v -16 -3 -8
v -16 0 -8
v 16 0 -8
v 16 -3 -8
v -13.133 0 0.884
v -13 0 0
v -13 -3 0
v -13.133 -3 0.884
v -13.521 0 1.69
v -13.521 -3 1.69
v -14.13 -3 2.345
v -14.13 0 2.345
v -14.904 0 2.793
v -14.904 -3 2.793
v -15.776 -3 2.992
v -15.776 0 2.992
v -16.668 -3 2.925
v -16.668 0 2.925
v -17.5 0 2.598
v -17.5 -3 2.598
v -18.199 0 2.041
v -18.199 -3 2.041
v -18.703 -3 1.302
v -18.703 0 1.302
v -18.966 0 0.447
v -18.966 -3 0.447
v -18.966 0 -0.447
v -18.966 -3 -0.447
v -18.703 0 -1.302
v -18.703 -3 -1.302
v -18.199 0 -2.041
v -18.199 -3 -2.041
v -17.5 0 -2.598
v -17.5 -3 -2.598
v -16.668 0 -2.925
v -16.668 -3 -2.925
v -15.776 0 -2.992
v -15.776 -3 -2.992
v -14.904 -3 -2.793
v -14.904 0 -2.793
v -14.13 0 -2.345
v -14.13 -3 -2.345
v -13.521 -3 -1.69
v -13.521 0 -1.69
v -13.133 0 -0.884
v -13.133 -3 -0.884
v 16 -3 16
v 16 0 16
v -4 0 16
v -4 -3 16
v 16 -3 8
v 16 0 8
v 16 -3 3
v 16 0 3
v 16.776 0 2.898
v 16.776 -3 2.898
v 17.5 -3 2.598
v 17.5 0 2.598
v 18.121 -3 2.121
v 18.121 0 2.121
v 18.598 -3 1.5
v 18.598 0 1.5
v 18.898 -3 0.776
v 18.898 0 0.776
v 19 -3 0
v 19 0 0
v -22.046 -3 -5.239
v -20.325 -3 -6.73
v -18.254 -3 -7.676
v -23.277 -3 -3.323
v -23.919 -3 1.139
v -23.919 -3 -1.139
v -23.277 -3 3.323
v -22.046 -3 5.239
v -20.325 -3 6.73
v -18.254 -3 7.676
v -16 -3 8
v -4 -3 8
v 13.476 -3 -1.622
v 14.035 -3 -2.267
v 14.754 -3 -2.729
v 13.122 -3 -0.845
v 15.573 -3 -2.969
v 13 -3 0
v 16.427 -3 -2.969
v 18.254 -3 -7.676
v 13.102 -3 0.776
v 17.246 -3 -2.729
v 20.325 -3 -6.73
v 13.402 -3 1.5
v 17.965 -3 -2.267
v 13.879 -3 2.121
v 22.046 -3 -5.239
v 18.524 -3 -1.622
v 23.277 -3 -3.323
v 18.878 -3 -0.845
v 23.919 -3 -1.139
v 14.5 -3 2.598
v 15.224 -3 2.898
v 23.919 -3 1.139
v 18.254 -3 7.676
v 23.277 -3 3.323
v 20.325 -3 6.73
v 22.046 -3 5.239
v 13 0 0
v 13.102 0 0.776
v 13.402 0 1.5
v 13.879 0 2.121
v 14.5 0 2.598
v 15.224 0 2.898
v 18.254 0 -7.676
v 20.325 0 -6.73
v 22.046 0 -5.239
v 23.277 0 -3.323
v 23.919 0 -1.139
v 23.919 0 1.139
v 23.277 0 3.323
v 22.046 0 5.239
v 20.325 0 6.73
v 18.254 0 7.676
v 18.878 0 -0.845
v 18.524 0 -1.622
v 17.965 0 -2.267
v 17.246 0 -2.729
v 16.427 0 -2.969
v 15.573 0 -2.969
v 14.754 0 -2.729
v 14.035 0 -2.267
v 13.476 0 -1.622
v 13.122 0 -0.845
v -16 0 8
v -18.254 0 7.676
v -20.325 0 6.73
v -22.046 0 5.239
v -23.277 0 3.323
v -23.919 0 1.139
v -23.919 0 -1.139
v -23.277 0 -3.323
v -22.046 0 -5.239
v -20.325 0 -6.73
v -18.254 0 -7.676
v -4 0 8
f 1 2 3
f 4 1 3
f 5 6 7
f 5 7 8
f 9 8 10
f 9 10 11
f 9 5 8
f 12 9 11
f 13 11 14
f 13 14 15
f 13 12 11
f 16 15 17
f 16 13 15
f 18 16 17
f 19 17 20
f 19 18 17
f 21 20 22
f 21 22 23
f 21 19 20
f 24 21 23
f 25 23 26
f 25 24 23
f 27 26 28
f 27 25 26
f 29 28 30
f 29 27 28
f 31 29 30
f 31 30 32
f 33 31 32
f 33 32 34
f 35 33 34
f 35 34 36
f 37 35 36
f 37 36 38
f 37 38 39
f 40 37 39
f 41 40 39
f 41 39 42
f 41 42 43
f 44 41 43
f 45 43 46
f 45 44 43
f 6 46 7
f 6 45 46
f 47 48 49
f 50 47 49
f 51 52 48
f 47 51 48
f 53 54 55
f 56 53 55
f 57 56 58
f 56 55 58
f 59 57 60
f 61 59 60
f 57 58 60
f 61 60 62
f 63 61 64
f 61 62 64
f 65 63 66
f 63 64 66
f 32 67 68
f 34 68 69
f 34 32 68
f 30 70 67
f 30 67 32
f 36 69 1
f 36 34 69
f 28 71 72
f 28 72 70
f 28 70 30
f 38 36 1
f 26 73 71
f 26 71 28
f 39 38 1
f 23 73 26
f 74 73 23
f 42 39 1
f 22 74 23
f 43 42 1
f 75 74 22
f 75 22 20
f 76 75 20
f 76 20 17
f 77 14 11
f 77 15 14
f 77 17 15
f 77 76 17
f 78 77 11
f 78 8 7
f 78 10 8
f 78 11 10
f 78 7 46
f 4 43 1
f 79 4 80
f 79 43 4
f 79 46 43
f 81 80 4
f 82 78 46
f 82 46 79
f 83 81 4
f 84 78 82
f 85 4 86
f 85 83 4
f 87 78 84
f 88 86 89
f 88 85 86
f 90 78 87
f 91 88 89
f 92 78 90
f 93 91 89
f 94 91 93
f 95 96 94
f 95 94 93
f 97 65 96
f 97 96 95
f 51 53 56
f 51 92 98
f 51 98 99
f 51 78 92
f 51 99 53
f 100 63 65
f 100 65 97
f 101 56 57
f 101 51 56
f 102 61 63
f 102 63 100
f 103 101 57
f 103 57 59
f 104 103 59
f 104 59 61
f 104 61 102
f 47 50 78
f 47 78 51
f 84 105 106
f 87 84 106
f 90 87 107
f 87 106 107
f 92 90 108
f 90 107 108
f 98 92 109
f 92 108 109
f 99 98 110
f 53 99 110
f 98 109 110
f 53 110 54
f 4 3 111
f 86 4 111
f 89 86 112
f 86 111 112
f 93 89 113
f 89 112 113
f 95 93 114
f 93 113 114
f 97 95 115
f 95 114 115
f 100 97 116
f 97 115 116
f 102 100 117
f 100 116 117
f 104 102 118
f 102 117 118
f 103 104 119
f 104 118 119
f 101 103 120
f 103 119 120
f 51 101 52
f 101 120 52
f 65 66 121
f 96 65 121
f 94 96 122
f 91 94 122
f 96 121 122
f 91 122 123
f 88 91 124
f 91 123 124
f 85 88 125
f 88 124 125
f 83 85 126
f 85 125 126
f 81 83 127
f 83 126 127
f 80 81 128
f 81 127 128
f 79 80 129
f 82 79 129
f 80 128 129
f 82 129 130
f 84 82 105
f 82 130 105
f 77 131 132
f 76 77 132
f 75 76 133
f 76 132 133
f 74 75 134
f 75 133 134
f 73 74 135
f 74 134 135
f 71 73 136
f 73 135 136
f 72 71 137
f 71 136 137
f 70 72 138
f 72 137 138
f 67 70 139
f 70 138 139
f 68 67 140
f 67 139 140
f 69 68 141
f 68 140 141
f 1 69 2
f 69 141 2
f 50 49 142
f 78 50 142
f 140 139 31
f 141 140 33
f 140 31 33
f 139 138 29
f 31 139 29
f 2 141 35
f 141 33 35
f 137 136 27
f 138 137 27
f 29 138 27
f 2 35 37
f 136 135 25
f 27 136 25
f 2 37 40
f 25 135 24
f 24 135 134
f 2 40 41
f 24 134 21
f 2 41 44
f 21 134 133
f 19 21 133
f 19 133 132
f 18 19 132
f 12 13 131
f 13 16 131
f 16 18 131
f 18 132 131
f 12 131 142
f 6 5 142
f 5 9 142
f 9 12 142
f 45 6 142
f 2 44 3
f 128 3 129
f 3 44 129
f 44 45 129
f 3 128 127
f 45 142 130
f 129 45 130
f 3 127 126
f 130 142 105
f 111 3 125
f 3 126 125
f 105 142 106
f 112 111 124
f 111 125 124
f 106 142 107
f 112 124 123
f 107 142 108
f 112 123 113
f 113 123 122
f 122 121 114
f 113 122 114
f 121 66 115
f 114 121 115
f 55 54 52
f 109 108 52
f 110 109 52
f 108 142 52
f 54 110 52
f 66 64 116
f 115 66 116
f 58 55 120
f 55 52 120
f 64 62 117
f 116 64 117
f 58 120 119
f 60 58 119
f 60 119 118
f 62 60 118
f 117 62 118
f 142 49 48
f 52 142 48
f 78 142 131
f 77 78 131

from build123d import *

# Parameters (mm, degrees)
F0_R     = 3
F1_DEPTH = 3


with BuildPart() as f1:
    # F0 (on Front) → F1 (new body)
    with BuildSketch(Plane.XZ):
        with BuildLine():
            ThreePointArc((16, -8), (24, 0), (16, 8))
            Line((16, 8), (16, 16))
            Line((16, 16), (-4, 16))
            Line((-4, 16), (-4, 8))
            Line((-4, 8), (-16, 8))
            ThreePointArc((-16, 8), (-24, 0), (-16, -8))
            Line((-16, -8), (16, -8))
        make_face()
        with Locations((-16, 0)):
            Circle(F0_R, mode=Mode.SUBTRACT)
        with BuildLine():
            ThreePointArc((19, 0), (16, -3), (13, 0))
            ThreePointArc((13, 0), (13.8786796564, 2.1213203436), (16, 3))
            ThreePointArc((16, 3), (18.1213203436, 2.1213203436), (19, 0))
        make_face(mode=Mode.SUBTRACT)
    extrude(amount=F1_DEPTH)


solid = f1.part
